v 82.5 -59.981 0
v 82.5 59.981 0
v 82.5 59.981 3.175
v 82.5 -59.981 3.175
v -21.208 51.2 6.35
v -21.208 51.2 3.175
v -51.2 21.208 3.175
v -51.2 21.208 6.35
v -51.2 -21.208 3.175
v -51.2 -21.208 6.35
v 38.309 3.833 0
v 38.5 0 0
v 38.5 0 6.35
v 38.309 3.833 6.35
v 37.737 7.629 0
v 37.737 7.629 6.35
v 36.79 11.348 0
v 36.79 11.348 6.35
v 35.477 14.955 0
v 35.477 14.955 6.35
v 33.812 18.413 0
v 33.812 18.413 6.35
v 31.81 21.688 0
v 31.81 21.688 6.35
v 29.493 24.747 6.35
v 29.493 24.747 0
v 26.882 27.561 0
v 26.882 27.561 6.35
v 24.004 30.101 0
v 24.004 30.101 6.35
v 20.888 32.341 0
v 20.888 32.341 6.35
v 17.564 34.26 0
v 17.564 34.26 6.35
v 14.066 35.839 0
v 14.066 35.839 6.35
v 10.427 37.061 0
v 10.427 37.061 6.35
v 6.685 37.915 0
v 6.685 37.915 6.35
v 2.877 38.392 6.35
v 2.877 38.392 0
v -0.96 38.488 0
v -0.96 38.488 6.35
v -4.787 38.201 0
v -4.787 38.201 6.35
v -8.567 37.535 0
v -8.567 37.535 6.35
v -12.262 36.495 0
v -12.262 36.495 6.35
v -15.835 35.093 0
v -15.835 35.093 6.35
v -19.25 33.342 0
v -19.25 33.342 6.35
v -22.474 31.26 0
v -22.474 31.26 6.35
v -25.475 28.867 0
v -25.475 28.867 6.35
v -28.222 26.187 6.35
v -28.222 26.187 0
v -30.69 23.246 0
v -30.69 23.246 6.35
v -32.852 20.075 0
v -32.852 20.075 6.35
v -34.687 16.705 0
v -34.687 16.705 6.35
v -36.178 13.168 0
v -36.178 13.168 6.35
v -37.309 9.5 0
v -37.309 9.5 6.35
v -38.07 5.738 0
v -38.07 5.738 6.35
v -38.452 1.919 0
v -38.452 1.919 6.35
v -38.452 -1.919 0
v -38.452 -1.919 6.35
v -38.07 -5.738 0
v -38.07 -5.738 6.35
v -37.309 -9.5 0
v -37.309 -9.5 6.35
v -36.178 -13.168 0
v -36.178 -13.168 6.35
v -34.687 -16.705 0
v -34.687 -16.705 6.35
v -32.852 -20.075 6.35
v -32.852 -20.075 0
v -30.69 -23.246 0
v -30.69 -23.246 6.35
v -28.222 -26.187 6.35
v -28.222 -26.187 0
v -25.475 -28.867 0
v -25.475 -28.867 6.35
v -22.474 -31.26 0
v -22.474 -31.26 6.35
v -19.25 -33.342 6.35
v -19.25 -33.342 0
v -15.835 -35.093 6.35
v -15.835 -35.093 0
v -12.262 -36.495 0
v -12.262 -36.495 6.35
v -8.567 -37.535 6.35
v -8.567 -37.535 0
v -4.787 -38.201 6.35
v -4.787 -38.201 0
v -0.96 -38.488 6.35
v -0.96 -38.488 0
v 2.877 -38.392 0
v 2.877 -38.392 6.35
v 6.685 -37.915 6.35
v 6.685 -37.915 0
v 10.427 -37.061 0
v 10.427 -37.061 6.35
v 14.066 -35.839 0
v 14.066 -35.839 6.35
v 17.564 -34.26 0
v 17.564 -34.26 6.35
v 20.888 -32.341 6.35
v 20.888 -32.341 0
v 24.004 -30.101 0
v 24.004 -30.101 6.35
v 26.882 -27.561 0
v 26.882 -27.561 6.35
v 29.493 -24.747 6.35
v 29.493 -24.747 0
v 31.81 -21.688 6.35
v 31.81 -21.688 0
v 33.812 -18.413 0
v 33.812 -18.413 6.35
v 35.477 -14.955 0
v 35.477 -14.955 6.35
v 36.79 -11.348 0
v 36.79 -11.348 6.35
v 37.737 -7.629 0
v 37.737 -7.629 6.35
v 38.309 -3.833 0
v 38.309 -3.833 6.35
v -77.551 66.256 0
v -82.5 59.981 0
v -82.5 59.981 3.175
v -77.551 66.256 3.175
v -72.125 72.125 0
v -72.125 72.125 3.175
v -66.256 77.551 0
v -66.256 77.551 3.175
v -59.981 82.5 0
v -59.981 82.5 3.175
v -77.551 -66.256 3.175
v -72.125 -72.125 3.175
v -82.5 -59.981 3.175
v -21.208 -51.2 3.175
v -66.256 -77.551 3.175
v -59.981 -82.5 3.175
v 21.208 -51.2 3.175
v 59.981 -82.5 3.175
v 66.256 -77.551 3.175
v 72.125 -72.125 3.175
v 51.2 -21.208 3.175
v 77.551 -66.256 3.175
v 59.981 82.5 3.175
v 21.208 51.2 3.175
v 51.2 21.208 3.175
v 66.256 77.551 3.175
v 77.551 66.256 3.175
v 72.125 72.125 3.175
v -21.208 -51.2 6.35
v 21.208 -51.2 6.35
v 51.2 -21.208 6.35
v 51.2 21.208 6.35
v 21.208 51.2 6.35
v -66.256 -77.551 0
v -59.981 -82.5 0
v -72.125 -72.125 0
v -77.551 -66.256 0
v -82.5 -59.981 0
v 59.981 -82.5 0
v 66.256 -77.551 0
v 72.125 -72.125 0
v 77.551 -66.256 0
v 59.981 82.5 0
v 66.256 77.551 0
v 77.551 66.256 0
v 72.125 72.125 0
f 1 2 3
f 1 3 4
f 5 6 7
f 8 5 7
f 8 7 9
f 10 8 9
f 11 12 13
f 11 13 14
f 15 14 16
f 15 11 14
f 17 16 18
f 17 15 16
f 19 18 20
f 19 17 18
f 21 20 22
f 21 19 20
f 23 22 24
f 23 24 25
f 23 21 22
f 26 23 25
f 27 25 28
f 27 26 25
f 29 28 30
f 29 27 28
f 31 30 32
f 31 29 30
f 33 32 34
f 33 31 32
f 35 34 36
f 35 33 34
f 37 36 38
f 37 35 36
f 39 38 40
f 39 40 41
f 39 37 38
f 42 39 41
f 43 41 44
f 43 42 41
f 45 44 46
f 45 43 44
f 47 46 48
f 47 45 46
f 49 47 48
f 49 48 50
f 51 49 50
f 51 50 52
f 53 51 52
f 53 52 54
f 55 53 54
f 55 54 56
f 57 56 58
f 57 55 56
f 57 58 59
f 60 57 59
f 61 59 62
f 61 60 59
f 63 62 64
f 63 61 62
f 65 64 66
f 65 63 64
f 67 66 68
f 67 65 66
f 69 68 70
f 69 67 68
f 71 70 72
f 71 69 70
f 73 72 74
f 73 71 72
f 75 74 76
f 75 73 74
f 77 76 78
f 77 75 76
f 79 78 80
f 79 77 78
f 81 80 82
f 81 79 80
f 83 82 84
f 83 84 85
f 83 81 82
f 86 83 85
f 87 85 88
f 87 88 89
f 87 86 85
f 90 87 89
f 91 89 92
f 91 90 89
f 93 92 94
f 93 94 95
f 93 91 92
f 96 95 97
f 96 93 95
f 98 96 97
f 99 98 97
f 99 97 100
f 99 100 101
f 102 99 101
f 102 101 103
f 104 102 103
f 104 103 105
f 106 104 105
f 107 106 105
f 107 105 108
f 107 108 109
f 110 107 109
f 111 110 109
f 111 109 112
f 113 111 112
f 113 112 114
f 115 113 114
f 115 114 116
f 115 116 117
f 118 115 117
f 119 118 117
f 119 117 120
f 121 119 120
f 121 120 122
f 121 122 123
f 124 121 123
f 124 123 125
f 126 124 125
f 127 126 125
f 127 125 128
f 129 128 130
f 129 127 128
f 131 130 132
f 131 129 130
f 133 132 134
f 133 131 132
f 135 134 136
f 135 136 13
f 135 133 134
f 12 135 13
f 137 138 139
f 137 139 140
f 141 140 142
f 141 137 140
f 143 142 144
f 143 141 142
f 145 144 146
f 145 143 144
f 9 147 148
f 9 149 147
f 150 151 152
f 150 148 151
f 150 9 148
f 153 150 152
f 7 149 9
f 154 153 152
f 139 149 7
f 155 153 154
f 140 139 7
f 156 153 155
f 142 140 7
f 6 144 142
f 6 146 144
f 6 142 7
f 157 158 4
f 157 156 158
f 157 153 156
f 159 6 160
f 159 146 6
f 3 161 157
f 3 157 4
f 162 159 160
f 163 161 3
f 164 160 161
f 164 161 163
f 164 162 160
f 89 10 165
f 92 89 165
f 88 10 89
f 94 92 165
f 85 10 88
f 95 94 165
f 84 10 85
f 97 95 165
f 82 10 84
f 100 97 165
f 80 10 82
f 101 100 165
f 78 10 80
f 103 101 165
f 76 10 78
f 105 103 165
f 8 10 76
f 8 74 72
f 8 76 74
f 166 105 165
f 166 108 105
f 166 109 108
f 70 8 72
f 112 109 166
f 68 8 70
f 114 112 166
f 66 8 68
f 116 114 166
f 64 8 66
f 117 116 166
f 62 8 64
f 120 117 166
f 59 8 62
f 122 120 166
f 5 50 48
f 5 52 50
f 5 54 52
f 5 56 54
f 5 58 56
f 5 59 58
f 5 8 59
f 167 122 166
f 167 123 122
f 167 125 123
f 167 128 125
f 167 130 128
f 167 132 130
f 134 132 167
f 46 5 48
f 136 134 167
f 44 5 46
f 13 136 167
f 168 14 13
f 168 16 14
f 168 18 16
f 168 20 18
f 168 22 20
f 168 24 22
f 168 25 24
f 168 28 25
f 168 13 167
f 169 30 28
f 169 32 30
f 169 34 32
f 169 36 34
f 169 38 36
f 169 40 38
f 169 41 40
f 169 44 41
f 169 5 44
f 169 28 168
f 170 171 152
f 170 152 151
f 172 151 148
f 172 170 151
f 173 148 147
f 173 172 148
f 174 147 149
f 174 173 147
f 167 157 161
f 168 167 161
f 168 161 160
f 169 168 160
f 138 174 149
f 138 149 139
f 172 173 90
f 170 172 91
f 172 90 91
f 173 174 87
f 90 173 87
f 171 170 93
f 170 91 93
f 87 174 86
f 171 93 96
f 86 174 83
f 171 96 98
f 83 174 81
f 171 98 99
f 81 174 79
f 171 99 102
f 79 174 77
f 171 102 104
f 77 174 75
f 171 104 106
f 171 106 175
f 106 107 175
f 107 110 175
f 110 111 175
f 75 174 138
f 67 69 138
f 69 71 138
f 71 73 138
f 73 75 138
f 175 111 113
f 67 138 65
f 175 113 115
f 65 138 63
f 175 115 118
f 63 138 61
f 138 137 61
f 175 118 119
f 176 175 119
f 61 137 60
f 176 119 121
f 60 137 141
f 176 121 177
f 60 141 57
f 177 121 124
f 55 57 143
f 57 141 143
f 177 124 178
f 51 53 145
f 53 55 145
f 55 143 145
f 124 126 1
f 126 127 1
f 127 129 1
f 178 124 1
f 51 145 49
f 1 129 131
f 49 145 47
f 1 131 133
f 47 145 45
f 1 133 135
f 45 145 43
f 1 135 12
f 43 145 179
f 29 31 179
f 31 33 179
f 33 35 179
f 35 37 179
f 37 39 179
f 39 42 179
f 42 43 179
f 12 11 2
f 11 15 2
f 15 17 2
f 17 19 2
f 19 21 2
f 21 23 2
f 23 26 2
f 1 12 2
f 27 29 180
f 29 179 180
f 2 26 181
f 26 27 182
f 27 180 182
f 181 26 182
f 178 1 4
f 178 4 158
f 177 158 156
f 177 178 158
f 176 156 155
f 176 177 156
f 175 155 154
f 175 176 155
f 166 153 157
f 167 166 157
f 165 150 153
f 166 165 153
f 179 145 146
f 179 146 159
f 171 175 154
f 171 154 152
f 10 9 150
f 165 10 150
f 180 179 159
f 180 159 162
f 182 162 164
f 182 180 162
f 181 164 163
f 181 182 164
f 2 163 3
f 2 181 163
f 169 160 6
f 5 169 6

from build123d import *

# Parameters (mm, degrees)
SKETCH1_W           = 203.947710216
SKETCH1_H           = 203.947710216
SKETCH1_R           = 38.5
BOSS_EXTRUDE1_DEPTH = 3.175
SKETCH1_3_R         = 38.5
BOSS_EXTRUDE2_DEPTH = 6.35
SKETCH6_W           = 203.947710216
SKETCH6_H           = 203.947710216
CUT_EXTRUDE1_DEPTH  = 15


with BuildPart() as part:
    # Sketch1 → Boss-Extrude1 (new body)
    with BuildSketch(Plane.XY):
        Rectangle(SKETCH1_W, SKETCH1_H)
        Circle(SKETCH1_R, mode=Mode.SUBTRACT)
    extrude(amount=BOSS_EXTRUDE1_DEPTH)

    # Sketch1<3> → Boss-Extrude2 (add)
    with BuildSketch(Plane.XY):
        Polygon((51.2, 21.207734394), (21.207734394, 51.2), (-21.207734394, 51.2), (-51.2, 21.207734394), (-51.2, -21.207734394), (-21.207734394, -51.2), (21.207734394, -51.2), (51.2, -21.207734394), align=None)
        Circle(SKETCH1_3_R, mode=Mode.SUBTRACT)
    extrude(amount=BOSS_EXTRUDE2_DEPTH)

    # Sketch6 → Cut-Extrude1 (cut)
    with BuildSketch(Plane(origin=(0, 0, 0), x_dir=(-1, 0, 0), z_dir=(0, 0, -1))):
        Rectangle(SKETCH6_W, SKETCH6_H)
        with BuildLine():
            Line((-82.5, -59.981247069), (-82.5, 59.981247069))
            ThreePointArc((-82.5, 59.981247069), (-72.124891681, 72.124891681), (-59.981247069, 82.5))
            Line((-59.981247069, 82.5), (59.981247069, 82.5))
            ThreePointArc((59.981247069, 82.5), (72.124891681, 72.124891681), (82.5, 59.981247069))
            Line((82.5, 59.981247069), (82.5, -59.981247069))
            ThreePointArc((82.5, -59.981247069), (72.124891681, -72.124891681), (59.981247069, -82.5))
            Line((59.981247069, -82.5), (-59.981247069, -82.5))
            ThreePointArc((-59.981247069, -82.5), (-72.124891681, -72.124891681), (-82.5, -59.981247069))
        make_face(mode=Mode.SUBTRACT)
    extrude(amount=-CUT_EXTRUDE1_DEPTH, mode=Mode.SUBTRACT)


solid = part.part
